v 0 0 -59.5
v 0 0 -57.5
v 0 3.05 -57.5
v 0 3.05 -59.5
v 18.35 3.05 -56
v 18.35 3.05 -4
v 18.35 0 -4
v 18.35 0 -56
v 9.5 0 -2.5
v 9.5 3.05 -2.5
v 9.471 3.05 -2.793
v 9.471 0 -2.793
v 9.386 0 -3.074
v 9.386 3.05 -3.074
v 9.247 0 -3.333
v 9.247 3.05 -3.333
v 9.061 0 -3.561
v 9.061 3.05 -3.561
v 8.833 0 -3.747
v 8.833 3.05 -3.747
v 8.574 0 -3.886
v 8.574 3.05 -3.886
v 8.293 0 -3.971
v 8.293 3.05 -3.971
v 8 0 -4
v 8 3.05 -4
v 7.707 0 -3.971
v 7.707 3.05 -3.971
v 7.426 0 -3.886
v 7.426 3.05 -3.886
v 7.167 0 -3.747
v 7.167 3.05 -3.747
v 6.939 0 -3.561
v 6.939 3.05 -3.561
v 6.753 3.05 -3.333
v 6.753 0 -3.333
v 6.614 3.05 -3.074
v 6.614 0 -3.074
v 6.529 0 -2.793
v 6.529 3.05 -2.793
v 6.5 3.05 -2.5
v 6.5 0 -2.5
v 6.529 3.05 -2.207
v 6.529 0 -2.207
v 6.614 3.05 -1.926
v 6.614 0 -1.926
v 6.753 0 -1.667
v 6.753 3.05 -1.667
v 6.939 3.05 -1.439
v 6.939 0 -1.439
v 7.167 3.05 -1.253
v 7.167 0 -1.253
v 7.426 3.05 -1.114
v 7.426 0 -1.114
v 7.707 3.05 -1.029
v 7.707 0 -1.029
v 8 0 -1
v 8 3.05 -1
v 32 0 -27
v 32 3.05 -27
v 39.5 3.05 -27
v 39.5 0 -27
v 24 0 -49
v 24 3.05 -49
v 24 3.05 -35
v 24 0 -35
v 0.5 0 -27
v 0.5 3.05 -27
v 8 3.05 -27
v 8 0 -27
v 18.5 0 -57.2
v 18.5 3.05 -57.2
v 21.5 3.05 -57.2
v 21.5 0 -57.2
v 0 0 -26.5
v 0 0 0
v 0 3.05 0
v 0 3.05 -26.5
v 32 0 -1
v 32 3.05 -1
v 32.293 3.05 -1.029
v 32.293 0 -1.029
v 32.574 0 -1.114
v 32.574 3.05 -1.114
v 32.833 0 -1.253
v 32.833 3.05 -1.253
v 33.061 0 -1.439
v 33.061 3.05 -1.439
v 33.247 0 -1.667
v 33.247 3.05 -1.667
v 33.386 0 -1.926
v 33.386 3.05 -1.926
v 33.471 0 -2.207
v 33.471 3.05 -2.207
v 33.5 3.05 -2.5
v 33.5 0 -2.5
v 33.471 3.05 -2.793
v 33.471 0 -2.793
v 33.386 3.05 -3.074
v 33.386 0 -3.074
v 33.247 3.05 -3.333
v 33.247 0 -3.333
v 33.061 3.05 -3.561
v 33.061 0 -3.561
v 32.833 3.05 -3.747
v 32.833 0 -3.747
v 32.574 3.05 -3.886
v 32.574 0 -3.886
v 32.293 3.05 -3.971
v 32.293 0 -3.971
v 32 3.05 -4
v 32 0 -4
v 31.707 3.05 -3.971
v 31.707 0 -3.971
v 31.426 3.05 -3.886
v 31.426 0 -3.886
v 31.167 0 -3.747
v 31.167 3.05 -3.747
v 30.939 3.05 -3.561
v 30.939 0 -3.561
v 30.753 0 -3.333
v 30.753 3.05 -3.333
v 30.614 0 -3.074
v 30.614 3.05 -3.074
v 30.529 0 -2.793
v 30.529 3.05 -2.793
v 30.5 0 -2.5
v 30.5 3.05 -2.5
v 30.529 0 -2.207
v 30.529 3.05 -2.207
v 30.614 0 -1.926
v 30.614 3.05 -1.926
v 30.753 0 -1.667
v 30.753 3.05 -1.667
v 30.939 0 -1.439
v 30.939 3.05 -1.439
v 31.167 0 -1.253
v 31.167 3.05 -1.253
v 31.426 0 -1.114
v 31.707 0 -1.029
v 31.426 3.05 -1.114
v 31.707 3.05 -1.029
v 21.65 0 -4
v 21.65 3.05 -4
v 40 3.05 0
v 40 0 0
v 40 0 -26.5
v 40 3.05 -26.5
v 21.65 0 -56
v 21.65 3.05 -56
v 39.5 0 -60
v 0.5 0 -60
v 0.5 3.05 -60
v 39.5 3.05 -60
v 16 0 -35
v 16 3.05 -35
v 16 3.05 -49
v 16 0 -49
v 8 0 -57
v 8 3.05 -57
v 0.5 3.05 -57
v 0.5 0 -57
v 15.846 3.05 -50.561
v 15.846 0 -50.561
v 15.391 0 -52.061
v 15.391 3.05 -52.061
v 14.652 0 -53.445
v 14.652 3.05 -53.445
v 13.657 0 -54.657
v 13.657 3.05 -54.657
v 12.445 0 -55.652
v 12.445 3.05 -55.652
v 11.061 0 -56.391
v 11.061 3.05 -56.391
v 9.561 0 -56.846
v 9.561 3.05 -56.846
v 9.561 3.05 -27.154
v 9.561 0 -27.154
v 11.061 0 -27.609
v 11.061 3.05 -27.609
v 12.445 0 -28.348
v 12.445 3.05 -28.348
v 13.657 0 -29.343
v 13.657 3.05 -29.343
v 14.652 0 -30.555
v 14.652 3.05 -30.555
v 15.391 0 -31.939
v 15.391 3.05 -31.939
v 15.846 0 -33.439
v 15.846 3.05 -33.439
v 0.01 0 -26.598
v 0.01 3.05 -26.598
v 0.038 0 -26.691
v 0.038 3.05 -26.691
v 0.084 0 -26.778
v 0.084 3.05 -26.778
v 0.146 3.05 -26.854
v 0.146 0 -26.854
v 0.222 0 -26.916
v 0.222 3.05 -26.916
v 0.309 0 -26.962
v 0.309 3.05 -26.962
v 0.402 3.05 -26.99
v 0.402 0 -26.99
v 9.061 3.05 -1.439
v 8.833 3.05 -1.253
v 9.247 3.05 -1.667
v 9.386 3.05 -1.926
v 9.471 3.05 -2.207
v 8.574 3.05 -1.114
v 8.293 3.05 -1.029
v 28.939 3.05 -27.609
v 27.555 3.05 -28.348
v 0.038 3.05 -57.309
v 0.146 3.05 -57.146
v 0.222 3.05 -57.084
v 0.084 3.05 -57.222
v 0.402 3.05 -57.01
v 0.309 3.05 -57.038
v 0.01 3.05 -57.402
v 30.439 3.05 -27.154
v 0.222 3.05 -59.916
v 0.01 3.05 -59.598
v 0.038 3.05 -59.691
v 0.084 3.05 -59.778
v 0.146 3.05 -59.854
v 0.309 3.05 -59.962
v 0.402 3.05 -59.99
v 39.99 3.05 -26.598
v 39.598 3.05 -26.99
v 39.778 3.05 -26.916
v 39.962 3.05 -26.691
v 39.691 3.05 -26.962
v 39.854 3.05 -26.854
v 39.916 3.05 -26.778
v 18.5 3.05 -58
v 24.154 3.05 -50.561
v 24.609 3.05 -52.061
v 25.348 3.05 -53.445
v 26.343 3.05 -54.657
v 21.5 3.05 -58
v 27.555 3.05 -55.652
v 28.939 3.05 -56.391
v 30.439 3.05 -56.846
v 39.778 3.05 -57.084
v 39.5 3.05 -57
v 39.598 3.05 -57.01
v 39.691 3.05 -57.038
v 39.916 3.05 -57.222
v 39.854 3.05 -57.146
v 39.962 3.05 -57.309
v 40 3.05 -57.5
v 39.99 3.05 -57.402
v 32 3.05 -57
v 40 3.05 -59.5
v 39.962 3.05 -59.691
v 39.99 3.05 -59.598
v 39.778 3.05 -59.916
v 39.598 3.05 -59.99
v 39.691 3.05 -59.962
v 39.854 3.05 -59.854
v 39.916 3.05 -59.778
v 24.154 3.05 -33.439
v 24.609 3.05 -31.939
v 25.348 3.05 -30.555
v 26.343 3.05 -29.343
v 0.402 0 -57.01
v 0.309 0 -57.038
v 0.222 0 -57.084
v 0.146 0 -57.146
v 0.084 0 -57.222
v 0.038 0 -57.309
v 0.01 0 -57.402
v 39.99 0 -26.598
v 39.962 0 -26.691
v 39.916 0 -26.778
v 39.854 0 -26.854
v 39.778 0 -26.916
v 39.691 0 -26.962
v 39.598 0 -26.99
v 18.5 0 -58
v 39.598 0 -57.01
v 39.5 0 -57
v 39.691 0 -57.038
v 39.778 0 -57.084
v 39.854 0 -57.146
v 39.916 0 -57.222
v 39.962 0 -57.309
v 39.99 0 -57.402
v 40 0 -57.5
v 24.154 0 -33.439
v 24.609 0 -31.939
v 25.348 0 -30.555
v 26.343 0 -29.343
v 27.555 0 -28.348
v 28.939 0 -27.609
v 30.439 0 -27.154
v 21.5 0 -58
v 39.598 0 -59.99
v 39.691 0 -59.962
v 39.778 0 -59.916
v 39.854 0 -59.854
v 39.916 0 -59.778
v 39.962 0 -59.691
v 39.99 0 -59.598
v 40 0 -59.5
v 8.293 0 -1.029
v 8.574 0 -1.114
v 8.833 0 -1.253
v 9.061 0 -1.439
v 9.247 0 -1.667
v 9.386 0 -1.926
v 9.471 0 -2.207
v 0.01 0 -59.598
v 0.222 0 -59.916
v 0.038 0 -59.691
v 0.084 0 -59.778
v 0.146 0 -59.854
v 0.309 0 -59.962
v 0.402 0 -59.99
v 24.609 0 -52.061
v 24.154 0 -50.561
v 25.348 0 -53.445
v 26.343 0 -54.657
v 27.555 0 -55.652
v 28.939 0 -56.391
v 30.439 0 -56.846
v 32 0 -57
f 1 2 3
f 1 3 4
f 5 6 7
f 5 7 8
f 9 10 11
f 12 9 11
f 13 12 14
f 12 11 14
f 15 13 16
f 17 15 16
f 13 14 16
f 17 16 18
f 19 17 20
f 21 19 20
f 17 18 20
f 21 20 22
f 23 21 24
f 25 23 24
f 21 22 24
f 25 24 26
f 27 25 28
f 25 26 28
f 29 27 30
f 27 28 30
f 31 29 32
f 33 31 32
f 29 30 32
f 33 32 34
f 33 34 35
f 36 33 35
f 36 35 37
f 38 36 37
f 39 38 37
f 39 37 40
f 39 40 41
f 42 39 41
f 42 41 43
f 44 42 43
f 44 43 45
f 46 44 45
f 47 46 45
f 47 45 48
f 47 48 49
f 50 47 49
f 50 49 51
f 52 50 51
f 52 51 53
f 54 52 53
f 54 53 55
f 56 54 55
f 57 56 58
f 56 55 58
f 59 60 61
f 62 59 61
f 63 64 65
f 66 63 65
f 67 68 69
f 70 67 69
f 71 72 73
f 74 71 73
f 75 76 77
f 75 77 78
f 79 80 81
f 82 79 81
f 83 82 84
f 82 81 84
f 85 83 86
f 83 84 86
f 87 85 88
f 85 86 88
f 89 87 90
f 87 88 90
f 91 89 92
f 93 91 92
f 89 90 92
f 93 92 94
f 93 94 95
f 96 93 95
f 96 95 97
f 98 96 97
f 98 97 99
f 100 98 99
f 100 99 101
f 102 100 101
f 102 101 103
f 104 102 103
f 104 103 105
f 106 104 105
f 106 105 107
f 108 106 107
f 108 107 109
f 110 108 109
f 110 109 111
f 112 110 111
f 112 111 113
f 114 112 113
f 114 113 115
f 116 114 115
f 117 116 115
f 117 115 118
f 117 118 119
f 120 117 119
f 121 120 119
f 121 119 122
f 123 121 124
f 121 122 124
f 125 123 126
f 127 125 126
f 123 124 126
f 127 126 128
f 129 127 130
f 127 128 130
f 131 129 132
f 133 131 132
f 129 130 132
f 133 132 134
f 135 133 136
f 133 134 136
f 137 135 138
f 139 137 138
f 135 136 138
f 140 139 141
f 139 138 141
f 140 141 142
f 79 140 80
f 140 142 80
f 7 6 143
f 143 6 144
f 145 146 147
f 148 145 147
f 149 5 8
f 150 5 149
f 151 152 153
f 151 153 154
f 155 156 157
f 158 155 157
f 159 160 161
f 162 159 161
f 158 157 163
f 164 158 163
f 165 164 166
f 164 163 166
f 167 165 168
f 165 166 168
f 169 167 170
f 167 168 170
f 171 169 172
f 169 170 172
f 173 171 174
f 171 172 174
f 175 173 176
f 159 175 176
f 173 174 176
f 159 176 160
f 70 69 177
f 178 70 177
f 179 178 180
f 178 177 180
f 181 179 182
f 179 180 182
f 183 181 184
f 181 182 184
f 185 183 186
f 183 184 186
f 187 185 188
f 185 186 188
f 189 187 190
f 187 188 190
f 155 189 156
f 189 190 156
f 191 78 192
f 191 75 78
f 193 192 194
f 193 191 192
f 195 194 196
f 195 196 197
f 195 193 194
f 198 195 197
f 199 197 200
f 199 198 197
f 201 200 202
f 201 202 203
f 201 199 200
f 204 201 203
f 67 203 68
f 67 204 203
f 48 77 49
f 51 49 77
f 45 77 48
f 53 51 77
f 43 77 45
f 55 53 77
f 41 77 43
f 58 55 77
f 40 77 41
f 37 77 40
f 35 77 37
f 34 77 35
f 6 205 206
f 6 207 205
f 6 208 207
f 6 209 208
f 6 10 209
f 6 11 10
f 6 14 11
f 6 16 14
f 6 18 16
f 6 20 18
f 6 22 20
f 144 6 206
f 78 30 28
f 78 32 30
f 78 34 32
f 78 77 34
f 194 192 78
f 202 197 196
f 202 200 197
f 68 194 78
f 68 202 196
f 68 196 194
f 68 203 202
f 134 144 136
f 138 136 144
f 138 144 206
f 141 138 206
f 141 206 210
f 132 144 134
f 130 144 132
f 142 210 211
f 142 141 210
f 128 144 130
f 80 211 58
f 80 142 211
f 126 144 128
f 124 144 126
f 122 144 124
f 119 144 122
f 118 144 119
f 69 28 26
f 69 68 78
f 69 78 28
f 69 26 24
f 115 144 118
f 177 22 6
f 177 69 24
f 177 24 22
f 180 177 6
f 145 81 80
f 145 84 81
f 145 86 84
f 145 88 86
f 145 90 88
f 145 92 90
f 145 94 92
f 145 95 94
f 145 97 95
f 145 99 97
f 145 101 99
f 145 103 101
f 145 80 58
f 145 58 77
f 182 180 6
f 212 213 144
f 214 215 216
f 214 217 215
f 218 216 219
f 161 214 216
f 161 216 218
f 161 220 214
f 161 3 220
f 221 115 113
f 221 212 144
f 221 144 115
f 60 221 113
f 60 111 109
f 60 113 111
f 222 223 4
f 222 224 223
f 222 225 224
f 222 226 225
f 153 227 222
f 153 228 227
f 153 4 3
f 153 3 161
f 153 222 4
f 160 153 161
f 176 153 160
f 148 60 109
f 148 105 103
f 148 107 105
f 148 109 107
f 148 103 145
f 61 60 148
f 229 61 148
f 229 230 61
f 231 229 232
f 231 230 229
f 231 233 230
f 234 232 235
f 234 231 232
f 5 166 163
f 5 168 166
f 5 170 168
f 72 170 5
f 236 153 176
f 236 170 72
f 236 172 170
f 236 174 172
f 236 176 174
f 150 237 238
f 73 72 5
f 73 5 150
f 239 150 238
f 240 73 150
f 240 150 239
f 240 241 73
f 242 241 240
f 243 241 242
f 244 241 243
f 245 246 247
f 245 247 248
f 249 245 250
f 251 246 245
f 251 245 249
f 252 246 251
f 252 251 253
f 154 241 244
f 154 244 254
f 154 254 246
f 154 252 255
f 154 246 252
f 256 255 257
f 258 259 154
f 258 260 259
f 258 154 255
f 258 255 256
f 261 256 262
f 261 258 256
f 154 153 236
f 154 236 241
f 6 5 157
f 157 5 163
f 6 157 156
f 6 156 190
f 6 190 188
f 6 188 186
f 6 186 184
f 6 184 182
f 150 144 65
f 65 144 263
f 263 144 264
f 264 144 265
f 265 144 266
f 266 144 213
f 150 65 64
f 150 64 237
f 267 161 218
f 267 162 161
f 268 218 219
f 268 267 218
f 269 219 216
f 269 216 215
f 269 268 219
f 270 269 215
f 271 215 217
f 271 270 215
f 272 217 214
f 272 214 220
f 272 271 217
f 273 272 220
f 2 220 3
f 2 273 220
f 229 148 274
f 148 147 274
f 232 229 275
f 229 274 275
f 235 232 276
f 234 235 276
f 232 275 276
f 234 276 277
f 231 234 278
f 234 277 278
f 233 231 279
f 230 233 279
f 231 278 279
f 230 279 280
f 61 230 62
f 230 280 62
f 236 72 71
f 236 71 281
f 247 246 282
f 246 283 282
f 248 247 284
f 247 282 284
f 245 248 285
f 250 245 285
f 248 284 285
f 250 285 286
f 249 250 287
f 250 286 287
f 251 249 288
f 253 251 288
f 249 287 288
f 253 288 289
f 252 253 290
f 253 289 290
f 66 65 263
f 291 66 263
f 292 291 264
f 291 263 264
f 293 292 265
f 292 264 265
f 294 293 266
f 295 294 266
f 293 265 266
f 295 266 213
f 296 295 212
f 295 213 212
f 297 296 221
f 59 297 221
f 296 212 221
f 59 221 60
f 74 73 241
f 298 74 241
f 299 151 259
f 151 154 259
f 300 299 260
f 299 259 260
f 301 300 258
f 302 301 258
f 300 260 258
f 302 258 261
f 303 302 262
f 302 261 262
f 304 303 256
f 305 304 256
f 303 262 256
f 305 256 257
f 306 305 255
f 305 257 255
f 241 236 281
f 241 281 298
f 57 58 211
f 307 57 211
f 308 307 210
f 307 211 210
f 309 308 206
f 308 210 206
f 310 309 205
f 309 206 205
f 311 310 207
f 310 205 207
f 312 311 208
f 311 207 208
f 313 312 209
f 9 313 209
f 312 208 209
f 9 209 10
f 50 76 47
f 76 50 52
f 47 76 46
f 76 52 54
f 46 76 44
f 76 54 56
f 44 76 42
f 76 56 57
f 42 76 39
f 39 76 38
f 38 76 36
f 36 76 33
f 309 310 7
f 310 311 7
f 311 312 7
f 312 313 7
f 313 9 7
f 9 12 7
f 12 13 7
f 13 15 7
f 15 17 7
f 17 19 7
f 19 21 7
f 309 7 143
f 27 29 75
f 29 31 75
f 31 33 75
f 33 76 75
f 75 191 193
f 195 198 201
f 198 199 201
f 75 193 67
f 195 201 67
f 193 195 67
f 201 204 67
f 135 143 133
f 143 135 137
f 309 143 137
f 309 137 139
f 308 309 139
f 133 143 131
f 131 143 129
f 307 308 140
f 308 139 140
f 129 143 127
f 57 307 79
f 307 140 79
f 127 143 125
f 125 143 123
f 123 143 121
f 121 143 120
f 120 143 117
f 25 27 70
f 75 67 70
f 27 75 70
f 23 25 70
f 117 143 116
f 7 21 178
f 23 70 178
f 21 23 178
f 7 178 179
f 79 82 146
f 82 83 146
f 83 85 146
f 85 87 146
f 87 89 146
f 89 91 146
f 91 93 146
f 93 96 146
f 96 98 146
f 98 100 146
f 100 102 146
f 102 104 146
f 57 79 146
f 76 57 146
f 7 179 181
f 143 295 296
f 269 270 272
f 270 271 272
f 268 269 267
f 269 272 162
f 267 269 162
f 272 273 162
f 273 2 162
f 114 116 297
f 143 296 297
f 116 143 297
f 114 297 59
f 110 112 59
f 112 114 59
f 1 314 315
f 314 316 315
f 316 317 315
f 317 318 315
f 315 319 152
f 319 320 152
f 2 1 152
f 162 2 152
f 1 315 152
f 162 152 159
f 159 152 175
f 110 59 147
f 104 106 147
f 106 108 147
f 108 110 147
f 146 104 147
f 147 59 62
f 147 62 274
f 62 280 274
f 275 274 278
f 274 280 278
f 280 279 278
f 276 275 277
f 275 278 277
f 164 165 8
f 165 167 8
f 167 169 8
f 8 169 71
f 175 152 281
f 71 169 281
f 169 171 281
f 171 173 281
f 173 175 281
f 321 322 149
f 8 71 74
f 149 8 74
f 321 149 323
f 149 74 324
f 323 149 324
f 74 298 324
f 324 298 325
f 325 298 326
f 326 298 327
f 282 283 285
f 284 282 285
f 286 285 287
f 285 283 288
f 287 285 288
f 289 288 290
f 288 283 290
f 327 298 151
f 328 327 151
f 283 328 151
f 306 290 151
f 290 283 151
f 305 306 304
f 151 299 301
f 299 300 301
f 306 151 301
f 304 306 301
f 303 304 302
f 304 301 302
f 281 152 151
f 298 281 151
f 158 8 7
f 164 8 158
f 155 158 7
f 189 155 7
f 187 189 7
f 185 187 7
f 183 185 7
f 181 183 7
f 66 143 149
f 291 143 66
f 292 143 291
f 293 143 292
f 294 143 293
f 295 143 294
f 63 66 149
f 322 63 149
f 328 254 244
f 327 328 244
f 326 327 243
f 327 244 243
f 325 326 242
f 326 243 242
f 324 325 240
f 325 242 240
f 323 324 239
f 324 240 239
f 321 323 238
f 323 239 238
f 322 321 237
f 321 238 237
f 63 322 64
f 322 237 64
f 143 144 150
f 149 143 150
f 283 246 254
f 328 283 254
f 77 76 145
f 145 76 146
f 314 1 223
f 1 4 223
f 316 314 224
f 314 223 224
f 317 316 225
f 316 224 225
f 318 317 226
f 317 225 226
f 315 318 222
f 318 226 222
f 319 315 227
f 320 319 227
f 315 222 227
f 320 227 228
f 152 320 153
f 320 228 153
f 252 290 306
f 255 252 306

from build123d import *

# Parameters (mm, degrees)
SKETCH1_W           = 40
SKETCH1_H           = 60
BOSS_EXTRUDE1_DEPTH = 3.05
SKETCH4_W           = 3.3
SKETCH4_H           = 52
SKETCH4_W_2         = 3
SKETCH4_H_2         = 0.8
CUT_EXTRUDE1_DEPTH  = 10
SKETCH7_R           = 8
CUT_EXTRUDE4_DEPTH  = 10
SKETCH8_R           = 1.5
CUT_EXTRUDE5_DEPTH  = 10
FILLET1_R           = 0.5


with BuildPart() as part:
    # Sketch1 → Boss-Extrude1 (new body)
    with BuildSketch(Plane(origin=(0, 0, 0), x_dir=(1, 0, 0), z_dir=(0, 1, 0))):
        with Locations((20, 30)):
            Rectangle(SKETCH1_W, SKETCH1_H)
    extrude(amount=BOSS_EXTRUDE1_DEPTH)

    # Sketch4 → Cut-Extrude1 (cut)
    with BuildSketch(Plane(origin=(0, 3.05, 0), x_dir=(1, 0, 0), z_dir=(0, 1, 0))):
        with Locations((20, 30)):
            Rectangle(SKETCH4_W, SKETCH4_H)
        with Locations((20, 57.6)):
            Rectangle(SKETCH4_W_2, SKETCH4_H_2)
    extrude(amount=-CUT_EXTRUDE1_DEPTH, mode=Mode.SUBTRACT)

    # Sketch7 → Cut-Extrude4 (cut)
    with BuildSketch(Plane(origin=(0, 3.05, 0), x_dir=(1, 0, 0), z_dir=(0, 1, 0))):
        with Locations((8, 35)):
            Circle(SKETCH7_R)
        with Locations((8, 49)):
            Circle(SKETCH7_R)
        with BuildLine():
            Line((8, 57), (0, 57))
            Line((0, 57), (0, 49))
            ThreePointArc((0, 49), (2.343145751, 54.656854249), (8, 57))
        make_face()
        with BuildLine():
            Line((16, 35), (16, 49))
            ThreePointArc((16, 49), (14.891439137, 44.936987987), (11.872983346, 42))
            ThreePointArc((11.872983346, 42), (14.891439137, 39.063012013), (16, 35))
        make_face()
        with BuildLine():
            ThreePointArc((4.127016654, 42), (1.108560863, 44.936987987), (0, 49))
            Line((0, 49), (0, 35))
            ThreePointArc((0, 35), (1.108560863, 39.063012013), (4.127016654, 42))
        make_face()
        with BuildLine():
            ThreePointArc((8, 27), (2.343145751, 29.343145751), (0, 35))
            Line((0, 35), (0, 27))
            Line((0, 27), (8, 27))
        make_face()
        with BuildLine():
            ThreePointArc((28.127016654, 42), (25.108560863, 44.936987987), (24, 49))
            Line((24, 49), (24, 35))
            ThreePointArc((24, 35), (25.108560863, 39.063012013), (28.127016654, 42))
        make_face()
        with Locations((32, 35)):
            Circle(SKETCH7_R)
        with Locations((32, 49)):
            Circle(SKETCH7_R)
        with BuildLine():
            Line((40, 35), (40, 49))
            ThreePointArc((40, 49), (38.891439137, 44.936987987), (35.872983346, 42))
            ThreePointArc((35.872983346, 42), (38.891439137, 39.063012013), (40, 35))
        make_face()
        with BuildLine():
            Line((40, 27), (40, 35))
            ThreePointArc((40, 35), (37.656854263, 29.343145764), (32.000000039, 27))
            Line((32.000000039, 27), (40, 27))
        make_face()
        with BuildLine():
            Line((40, 49), (40, 57))
            Line((40, 57), (32, 57))
            ThreePointArc((32, 57), (37.656854249, 54.656854249), (40, 49))
        make_face()
    extrude(amount=-CUT_EXTRUDE4_DEPTH, mode=Mode.SUBTRACT)

    # Sketch8 → Cut-Extrude5 (cut)
    with BuildSketch(Plane(origin=(0, 3.05, 0), x_dir=(1, 0, 0), z_dir=(0, 1, 0))):
        with BuildLine():
            ThreePointArc((9.5, 2.5), (6.939339828, 3.560660172), (8, 1))
            Line((8, 1), (8, 2.5))
            Line((8, 2.5), (9.5, 2.5))
        make_face()
        with BuildLine():
            Line((8, 2.5), (8, 1))
            ThreePointArc((8, 1), (9.060660172, 1.439339828), (9.5, 2.5))
            Line((9.5, 2.5), (8, 2.5))
        make_face()
        with Locations(Location((32, 2.5, 0), (0, 0, 270))):
            Circle(SKETCH8_R)
    extrude(amount=-CUT_EXTRUDE5_DEPTH, mode=Mode.SUBTRACT)

    # Fillet1
    fillet1_edges = [part.edges().sort_by_distance(p)[0] for p in [
        (0, 1.525, -27),
        (0, 1.525, -57),
        (40, 1.525, -57),
        (40, 1.525, -27),
        (0, 1.525, -60),
        (40, 1.525, -60),
    ]]
    fillet(fillet1_edges, radius=FILLET1_R)


solid = part.part
